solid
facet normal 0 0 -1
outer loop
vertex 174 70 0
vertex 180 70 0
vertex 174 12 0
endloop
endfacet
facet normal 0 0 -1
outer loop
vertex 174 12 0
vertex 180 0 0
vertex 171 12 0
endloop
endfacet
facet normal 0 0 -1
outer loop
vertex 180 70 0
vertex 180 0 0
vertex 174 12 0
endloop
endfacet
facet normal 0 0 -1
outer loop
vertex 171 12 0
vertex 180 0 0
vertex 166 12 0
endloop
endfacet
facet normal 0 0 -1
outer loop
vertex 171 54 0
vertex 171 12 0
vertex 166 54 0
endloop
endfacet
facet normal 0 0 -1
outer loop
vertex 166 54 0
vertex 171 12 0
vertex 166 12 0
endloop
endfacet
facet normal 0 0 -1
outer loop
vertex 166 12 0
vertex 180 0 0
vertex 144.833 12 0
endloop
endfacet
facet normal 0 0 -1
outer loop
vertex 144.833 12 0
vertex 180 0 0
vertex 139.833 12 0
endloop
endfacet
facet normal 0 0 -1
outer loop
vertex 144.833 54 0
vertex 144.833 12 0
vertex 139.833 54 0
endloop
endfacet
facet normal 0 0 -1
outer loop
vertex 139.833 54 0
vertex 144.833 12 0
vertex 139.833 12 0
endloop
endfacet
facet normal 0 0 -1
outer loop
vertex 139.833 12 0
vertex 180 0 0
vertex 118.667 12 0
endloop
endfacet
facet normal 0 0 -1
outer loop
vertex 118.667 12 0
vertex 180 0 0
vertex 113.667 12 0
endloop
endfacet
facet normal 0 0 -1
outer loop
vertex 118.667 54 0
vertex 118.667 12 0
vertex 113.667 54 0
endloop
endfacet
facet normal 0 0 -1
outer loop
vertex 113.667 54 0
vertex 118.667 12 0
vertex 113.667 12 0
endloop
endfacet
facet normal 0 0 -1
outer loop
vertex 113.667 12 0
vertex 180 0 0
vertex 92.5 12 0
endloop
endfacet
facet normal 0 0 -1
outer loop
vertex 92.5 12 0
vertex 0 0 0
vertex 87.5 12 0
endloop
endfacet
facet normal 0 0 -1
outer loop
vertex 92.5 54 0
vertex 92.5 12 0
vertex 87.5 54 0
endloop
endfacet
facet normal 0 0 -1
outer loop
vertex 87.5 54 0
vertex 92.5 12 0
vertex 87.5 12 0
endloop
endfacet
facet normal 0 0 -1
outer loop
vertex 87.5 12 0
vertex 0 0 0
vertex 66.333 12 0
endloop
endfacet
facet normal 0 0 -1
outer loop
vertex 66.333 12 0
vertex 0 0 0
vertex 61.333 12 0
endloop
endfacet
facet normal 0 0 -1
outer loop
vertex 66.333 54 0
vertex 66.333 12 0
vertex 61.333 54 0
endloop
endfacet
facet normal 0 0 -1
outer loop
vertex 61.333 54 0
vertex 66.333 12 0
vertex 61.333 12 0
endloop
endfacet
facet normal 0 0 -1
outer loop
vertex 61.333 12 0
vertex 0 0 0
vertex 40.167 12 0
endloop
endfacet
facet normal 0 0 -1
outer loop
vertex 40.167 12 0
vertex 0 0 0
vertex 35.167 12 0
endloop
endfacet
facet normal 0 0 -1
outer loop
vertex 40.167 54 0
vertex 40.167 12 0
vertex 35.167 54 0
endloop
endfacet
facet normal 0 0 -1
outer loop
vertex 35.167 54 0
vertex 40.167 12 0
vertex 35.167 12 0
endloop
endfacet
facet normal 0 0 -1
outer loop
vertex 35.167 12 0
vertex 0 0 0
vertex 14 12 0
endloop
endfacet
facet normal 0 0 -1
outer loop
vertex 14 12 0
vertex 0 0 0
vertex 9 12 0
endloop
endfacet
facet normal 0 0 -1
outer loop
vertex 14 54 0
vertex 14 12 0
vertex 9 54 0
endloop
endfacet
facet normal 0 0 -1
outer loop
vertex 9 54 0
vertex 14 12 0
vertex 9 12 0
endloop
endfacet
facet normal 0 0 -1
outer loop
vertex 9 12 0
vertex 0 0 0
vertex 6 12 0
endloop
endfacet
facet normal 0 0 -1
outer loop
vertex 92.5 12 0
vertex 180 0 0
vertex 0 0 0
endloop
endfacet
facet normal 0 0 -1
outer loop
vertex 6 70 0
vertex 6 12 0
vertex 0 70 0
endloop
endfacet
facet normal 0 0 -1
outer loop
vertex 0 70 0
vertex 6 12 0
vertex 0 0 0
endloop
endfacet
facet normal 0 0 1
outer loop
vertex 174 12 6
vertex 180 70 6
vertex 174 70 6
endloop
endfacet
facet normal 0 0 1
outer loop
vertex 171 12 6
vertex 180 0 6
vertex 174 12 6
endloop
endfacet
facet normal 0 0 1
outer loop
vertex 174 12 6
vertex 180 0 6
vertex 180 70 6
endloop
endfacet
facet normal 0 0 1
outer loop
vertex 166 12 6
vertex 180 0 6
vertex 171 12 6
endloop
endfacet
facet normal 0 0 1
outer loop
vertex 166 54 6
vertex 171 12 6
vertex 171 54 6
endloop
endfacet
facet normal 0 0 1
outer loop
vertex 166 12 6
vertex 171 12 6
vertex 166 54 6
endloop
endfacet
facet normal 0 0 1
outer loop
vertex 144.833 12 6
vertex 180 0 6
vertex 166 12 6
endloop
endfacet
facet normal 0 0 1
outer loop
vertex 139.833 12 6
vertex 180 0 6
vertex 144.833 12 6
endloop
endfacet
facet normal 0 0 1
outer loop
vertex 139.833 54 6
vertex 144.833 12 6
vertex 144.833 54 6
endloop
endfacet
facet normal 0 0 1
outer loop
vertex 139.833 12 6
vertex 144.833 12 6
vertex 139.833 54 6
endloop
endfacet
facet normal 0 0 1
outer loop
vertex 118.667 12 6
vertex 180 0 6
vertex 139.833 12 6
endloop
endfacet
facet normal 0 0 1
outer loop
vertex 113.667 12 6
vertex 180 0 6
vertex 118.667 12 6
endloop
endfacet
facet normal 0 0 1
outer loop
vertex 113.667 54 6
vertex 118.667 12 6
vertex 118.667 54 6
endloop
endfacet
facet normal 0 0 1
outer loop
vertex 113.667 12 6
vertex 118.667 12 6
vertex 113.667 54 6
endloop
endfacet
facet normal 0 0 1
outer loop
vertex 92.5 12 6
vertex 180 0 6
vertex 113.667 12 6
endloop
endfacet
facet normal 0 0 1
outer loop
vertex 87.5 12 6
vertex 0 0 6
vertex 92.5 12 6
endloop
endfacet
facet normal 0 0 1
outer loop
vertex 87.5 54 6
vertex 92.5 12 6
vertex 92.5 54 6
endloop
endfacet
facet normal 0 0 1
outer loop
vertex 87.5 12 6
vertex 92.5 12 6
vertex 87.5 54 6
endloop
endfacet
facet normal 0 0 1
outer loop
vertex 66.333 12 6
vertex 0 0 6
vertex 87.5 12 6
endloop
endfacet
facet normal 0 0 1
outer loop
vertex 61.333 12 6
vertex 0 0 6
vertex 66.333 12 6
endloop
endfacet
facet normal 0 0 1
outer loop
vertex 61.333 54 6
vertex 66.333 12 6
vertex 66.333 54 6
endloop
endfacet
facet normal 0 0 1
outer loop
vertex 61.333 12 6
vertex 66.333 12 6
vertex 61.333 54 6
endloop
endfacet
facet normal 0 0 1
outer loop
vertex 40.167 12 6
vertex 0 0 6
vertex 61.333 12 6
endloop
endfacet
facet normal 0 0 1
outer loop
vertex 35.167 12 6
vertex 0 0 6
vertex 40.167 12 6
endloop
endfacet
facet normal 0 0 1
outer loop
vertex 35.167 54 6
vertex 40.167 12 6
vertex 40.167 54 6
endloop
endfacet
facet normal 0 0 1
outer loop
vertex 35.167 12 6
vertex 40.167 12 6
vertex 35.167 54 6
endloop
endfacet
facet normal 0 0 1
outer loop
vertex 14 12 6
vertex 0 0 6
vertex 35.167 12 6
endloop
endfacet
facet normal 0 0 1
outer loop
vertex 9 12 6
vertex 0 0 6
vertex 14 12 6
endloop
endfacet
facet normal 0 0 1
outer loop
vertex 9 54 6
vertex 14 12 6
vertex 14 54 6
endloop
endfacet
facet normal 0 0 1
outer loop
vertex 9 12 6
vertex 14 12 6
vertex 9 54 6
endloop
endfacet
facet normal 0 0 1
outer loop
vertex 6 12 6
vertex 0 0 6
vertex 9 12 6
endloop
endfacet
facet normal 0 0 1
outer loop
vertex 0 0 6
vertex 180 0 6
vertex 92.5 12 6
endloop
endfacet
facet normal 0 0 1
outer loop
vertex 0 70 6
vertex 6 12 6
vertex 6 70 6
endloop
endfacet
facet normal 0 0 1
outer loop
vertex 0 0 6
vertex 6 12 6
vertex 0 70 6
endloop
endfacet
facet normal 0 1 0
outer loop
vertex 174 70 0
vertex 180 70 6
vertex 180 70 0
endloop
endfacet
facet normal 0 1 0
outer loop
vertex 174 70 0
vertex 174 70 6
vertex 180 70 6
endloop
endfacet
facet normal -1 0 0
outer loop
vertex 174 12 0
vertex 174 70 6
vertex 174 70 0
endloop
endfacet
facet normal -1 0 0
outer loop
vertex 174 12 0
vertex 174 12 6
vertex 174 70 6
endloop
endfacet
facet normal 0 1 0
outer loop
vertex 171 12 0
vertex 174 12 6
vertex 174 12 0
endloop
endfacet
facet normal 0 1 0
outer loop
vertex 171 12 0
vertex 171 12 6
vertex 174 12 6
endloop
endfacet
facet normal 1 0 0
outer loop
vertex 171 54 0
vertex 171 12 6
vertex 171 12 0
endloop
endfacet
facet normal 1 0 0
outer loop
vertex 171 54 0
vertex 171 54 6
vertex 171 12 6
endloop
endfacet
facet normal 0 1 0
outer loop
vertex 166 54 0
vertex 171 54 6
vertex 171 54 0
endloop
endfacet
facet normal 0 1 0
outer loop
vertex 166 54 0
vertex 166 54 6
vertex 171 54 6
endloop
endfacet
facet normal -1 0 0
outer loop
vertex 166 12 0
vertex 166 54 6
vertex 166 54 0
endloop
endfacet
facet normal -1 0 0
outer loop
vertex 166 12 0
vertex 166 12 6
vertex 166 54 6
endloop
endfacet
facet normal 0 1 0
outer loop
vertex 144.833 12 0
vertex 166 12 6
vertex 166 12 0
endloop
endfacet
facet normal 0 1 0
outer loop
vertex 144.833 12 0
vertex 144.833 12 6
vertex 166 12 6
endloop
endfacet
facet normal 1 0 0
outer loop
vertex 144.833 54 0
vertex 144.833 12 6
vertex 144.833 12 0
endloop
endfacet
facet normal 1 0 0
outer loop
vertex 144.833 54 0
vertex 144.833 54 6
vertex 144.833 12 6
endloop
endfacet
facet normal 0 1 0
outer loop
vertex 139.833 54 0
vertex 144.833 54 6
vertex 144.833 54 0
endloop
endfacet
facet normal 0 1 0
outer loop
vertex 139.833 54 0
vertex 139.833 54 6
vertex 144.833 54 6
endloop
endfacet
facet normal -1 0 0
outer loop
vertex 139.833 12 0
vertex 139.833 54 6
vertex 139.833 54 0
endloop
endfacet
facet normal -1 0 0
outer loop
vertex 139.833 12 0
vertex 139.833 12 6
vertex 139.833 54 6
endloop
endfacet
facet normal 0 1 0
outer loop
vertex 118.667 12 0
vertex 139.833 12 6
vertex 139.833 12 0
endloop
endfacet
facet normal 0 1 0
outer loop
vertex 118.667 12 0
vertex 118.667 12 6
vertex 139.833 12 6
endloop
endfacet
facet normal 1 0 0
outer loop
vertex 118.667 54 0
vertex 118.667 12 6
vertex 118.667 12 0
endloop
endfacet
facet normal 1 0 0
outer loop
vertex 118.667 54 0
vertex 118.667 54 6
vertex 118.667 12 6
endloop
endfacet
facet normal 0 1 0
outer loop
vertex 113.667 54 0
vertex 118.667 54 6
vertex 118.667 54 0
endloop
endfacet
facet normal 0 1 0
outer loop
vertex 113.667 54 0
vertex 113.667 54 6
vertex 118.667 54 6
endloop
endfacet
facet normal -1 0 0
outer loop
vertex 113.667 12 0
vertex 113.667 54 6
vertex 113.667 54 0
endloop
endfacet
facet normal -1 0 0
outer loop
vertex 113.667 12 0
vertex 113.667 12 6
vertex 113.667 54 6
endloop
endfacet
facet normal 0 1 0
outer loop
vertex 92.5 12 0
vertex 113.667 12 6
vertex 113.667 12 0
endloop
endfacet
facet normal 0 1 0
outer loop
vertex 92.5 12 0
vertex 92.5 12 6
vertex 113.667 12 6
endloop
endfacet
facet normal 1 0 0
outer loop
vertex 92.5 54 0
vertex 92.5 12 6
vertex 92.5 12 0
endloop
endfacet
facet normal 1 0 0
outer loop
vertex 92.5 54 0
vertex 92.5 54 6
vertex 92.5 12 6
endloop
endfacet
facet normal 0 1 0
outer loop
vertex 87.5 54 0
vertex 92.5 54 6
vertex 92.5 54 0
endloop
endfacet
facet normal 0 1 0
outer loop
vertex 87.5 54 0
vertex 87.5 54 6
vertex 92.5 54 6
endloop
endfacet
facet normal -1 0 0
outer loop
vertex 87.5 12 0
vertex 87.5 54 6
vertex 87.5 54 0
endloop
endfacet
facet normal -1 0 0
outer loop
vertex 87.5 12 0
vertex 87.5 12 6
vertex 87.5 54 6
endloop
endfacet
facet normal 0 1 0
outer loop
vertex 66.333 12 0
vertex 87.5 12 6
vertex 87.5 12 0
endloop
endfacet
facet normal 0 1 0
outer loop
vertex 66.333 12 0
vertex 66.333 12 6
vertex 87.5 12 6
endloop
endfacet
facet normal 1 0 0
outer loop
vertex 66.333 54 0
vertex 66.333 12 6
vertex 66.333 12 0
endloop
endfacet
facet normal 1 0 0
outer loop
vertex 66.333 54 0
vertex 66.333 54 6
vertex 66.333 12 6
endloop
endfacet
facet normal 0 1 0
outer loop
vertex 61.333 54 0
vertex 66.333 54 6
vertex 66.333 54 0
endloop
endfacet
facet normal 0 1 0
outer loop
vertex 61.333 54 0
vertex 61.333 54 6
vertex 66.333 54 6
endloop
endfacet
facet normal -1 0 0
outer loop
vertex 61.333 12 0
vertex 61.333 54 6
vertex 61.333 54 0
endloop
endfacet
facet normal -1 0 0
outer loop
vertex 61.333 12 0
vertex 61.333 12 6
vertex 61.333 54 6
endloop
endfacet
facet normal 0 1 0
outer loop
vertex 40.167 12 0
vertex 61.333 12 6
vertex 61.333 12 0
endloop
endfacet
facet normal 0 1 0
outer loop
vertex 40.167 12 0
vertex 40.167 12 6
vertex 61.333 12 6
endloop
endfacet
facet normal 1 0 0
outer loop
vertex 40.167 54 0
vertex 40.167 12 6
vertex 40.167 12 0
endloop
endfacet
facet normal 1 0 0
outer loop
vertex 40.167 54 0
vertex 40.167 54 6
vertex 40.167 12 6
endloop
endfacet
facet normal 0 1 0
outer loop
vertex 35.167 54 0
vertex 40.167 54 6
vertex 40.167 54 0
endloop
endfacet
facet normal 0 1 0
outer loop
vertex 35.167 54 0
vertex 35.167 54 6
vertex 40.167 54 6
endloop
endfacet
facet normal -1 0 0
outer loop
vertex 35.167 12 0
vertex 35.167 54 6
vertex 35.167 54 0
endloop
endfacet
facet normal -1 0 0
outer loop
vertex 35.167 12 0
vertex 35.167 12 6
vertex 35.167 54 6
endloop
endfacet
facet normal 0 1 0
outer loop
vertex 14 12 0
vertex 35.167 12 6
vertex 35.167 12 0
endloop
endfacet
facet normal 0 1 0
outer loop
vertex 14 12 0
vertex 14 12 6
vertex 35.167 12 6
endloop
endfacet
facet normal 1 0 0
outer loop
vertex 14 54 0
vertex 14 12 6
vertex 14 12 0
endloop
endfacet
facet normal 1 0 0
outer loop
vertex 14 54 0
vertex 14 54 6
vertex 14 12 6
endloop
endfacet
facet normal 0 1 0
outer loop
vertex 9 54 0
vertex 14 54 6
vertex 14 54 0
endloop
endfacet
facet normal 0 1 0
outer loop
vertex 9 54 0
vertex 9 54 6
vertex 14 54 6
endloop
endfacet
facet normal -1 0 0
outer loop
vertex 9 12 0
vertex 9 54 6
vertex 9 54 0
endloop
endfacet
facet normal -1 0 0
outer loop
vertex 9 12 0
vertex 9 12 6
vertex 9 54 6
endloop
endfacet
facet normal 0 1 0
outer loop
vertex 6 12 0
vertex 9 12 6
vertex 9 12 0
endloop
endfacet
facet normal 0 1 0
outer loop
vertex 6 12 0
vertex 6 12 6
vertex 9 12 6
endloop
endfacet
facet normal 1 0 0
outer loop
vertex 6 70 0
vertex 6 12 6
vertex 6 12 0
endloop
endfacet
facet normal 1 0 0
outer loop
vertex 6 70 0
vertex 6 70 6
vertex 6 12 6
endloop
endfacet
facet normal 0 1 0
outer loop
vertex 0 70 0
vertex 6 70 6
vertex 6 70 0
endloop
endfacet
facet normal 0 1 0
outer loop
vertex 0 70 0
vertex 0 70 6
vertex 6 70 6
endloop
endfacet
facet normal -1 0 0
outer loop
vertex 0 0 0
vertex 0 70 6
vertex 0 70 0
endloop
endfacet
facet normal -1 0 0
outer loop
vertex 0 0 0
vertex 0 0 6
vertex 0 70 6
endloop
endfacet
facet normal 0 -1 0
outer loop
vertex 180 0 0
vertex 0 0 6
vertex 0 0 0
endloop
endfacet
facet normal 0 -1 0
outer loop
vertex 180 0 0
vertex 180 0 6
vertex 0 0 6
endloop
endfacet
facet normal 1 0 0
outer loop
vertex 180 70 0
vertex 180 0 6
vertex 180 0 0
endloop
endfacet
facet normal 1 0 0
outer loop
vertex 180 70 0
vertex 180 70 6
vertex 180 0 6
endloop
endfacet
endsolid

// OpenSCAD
$fn = 32;

// ----------------------------------------------------------------------
// Guard grille: 7 slats over a 180 x 70 mm plate
// ----------------------------------------------------------------------

// --- parameters (mm) ---
profile_height = 6;       // extrusion height
profile_points = 36;      // points of the closed outline

profile = [[0, 0], [180, 0], [180, 70], [174, 70], [174, 12], [171, 12], [171, 54], [166, 54], [166, 12], [144.833, 12], [144.833, 54], [139.833, 54], [139.833, 12], [118.667, 12], [118.667, 54], [113.667, 54], [113.667, 12], [92.5, 12], [92.5, 54], [87.5, 54], [87.5, 12], [66.333, 12], [66.333, 54], [61.333, 54], [61.333, 12], [40.167, 12], [40.167, 54], [35.167, 54], [35.167, 12], [14, 12], [14, 54], [9, 54], [9, 12], [6, 12], [6, 70], [0, 70]];  // single closed polygon, 36 points, counter clockwise

// --- the one profile operation ---
linear_extrude(height = profile_height) polygon(points = profile);
